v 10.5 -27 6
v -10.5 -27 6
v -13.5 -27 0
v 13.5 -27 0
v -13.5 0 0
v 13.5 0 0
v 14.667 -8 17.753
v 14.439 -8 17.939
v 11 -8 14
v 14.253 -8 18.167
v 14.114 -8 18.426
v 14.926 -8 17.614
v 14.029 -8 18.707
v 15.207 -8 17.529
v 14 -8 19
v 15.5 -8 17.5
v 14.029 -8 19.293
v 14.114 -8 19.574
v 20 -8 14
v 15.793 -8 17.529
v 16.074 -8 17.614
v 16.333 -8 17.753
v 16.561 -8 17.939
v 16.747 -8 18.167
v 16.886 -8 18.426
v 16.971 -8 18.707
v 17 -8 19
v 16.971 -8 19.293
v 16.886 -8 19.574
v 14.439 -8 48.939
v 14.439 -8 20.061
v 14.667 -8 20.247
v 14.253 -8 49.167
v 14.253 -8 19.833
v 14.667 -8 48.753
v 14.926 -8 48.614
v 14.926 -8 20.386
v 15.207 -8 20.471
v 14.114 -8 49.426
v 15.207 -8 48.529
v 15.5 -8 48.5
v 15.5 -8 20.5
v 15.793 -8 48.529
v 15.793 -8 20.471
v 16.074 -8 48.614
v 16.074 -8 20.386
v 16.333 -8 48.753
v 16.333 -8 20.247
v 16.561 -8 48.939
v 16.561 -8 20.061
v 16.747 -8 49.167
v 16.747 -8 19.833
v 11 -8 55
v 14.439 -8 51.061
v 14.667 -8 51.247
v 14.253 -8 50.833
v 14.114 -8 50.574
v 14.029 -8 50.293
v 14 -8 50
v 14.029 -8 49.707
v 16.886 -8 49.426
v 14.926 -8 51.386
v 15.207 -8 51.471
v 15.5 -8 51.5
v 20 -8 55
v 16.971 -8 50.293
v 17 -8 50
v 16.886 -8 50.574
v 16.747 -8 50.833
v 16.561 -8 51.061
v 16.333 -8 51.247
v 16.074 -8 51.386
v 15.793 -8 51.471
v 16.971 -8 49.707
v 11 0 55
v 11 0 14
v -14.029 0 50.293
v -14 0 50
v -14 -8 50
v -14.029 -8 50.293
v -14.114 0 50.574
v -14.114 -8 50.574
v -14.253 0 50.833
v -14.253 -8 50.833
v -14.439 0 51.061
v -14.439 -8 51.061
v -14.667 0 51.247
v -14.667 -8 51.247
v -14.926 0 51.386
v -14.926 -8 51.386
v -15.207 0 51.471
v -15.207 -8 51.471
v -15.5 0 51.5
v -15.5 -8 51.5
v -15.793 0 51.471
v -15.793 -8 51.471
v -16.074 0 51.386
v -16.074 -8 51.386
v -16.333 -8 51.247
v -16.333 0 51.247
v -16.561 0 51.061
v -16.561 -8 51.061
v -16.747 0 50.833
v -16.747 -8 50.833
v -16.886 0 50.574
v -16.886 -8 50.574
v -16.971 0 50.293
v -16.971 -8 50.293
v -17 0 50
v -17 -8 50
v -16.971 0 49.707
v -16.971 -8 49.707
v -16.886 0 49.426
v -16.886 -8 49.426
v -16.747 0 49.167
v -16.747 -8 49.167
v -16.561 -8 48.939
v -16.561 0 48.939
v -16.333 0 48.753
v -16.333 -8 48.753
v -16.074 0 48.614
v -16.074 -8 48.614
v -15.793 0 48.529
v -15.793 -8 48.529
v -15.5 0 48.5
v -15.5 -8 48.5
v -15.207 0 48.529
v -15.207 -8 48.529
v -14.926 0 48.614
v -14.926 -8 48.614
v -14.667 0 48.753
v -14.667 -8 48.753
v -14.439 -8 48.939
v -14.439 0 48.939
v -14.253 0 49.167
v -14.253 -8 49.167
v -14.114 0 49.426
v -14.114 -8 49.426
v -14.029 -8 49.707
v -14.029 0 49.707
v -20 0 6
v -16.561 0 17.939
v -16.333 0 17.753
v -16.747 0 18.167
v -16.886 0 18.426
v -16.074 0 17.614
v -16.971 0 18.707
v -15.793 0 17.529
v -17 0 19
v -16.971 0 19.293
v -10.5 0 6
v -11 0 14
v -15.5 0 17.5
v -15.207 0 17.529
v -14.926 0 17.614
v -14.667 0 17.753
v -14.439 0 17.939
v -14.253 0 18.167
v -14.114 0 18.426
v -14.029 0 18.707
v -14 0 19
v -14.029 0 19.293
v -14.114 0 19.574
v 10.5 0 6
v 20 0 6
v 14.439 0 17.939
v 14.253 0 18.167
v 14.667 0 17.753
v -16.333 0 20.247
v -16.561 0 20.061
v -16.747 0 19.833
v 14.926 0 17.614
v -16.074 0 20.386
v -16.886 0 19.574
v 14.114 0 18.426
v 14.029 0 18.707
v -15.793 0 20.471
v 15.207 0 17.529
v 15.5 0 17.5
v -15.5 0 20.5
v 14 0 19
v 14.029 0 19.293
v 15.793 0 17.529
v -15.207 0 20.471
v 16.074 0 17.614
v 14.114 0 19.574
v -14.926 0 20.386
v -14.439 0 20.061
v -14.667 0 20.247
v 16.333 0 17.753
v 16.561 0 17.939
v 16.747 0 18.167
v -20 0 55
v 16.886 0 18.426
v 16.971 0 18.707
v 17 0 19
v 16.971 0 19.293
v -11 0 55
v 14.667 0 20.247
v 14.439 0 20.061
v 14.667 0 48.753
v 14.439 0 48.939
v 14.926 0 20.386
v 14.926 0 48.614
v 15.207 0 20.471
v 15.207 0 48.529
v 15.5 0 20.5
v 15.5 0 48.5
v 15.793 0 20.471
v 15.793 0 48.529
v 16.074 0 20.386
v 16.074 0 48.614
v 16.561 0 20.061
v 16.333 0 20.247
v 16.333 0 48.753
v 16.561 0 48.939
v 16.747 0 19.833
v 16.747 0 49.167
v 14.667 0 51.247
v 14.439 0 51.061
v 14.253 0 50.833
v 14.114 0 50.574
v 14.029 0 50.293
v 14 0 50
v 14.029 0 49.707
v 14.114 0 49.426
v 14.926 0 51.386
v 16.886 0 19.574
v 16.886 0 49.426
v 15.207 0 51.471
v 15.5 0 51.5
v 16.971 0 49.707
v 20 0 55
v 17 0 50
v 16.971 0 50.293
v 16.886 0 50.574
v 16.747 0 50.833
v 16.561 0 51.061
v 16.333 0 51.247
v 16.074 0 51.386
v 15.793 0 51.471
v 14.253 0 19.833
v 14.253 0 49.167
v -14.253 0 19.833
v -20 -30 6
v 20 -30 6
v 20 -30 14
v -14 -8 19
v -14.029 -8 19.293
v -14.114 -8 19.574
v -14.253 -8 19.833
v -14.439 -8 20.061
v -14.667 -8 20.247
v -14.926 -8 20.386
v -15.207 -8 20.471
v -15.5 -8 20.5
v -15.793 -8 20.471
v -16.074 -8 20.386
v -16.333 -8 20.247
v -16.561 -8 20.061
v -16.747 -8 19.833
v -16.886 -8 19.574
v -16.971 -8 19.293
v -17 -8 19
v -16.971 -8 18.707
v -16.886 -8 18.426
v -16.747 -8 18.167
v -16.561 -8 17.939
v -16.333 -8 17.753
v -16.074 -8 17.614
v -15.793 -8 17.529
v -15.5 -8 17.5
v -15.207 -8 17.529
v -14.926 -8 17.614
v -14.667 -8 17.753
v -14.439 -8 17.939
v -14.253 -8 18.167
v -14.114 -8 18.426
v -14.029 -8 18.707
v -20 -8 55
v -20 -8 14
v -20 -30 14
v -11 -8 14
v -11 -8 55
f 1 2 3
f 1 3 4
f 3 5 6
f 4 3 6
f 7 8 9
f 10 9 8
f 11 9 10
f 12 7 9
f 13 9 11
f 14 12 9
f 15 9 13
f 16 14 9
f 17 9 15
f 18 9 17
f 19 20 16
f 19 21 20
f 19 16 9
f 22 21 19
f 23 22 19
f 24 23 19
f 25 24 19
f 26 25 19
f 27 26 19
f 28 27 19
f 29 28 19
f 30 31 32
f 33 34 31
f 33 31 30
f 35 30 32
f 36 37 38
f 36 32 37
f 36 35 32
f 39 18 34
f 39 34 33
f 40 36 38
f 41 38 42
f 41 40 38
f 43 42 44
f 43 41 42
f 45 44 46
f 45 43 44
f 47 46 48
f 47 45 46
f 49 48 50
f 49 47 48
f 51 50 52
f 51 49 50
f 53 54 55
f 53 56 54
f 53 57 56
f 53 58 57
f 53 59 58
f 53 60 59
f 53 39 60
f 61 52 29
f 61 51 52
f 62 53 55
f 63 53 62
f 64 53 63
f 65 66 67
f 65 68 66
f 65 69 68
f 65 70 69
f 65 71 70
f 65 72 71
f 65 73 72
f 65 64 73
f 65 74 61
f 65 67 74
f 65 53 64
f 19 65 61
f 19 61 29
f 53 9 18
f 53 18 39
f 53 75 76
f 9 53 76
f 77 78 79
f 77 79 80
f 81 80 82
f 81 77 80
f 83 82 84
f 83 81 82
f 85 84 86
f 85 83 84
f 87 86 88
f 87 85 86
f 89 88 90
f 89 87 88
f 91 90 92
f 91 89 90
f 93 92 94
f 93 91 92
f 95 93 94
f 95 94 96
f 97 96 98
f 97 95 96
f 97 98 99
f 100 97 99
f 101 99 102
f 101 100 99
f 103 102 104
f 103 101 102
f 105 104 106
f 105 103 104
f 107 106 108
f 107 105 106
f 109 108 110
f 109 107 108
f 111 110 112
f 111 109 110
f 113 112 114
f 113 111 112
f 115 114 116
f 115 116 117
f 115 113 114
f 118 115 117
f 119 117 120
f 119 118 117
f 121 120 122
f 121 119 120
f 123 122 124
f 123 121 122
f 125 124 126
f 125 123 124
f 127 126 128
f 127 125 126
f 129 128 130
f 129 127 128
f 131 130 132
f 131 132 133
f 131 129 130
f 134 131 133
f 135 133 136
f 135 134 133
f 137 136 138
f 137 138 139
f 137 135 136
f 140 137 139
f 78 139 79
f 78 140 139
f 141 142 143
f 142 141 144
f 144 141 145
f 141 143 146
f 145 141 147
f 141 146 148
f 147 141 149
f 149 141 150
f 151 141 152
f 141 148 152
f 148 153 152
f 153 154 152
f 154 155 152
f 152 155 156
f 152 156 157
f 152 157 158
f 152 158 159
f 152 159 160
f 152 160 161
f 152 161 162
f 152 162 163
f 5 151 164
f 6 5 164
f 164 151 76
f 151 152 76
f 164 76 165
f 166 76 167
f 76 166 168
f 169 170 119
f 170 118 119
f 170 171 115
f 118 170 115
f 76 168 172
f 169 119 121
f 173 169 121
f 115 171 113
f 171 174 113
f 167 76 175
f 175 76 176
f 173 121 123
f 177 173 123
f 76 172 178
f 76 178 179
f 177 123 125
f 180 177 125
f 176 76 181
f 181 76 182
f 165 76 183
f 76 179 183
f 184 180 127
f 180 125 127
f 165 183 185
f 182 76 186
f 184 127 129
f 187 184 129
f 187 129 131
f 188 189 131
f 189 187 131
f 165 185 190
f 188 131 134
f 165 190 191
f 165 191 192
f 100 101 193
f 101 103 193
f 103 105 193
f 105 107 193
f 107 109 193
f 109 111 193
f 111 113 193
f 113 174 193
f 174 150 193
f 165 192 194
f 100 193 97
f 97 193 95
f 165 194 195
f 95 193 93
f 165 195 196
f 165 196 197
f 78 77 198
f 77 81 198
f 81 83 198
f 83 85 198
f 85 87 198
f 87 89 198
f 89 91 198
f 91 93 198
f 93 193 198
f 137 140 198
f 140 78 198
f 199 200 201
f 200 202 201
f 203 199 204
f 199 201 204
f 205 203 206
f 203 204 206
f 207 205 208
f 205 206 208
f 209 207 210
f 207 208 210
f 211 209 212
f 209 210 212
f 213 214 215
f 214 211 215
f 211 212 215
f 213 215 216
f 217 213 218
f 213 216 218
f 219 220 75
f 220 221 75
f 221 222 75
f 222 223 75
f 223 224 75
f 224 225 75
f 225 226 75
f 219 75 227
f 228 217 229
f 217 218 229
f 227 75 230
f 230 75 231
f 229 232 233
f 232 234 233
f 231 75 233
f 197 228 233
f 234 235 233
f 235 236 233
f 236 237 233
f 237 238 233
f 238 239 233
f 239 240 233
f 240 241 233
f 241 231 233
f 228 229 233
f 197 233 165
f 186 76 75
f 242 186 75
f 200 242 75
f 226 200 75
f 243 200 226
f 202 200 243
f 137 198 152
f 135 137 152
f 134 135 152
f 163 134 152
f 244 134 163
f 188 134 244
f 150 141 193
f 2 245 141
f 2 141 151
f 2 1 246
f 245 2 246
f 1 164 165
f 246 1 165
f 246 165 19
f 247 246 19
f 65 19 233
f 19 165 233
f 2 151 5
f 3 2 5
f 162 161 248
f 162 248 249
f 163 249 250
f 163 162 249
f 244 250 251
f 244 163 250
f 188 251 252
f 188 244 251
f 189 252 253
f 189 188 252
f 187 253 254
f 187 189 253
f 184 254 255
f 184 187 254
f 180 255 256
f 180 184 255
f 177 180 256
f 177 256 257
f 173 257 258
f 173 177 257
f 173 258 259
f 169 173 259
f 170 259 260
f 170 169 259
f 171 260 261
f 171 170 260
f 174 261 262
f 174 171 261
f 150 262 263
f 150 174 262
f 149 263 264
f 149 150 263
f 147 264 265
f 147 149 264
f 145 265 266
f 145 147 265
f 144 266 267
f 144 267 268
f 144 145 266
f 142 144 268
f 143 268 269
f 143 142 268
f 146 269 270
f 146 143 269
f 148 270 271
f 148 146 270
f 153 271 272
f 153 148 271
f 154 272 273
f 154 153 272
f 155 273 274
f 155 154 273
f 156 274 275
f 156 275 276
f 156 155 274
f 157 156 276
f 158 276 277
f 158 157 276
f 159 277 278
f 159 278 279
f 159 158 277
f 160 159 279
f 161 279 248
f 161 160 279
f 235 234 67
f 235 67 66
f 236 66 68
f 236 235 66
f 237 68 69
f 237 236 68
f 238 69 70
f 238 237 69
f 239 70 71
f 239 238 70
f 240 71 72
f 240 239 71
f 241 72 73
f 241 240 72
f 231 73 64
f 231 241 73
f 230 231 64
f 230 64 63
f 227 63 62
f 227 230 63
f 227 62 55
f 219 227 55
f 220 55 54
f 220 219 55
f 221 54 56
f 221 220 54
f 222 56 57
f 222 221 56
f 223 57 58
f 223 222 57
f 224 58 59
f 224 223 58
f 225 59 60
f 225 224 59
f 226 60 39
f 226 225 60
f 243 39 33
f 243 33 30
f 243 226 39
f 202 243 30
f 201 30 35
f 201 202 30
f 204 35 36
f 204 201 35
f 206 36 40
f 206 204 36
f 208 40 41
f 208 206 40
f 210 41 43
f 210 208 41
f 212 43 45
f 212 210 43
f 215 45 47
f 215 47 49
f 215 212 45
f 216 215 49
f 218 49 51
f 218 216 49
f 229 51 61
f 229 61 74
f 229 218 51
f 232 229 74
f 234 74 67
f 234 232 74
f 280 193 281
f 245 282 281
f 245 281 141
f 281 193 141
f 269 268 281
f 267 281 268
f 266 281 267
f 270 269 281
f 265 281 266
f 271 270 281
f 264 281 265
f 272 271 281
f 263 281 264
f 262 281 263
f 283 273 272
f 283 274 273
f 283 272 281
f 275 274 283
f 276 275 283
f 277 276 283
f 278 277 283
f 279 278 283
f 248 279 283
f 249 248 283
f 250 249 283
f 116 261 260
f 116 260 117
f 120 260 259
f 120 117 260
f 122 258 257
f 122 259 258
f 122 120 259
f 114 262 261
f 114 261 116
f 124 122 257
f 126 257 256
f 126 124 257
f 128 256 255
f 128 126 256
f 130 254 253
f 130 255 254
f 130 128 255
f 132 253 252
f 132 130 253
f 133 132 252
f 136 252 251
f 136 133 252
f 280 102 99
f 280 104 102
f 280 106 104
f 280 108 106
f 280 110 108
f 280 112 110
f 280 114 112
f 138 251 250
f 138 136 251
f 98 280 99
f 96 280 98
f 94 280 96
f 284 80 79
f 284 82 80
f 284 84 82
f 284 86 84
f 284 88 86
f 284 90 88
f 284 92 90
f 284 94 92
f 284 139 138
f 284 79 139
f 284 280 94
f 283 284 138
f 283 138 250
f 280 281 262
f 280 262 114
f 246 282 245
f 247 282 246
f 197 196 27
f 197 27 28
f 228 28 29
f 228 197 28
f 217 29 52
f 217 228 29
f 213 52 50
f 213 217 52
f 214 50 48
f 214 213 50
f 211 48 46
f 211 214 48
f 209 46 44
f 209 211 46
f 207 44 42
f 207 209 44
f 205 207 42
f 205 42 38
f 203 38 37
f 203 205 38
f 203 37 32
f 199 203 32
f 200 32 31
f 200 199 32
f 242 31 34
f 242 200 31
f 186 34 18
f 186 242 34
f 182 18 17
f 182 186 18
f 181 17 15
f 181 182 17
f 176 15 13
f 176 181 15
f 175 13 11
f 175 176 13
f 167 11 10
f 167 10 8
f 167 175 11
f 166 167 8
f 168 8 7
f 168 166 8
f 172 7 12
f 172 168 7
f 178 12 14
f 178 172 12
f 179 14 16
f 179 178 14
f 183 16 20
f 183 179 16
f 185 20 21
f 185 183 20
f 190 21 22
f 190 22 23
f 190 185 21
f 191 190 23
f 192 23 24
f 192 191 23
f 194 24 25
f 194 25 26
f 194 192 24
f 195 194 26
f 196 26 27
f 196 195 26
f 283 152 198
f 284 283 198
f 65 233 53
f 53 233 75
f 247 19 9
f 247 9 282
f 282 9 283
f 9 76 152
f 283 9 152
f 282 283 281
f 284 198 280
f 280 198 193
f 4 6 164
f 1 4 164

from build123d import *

# Parameters (mm, degrees)
F1_DEPTH = 27
F2_R     = 1.5
F3_DEPTH = 8
F4_W     = 40
F4_H     = 8
F5_DEPTH = 30


with BuildPart() as f1:
    # F0 (on Front) → F1 (new body)
    with BuildSketch(Plane.XZ):
        Polygon((-10.5, 6), (-13.5, 0), (13.5, 0), (10.5, 6), align=None)
    extrude(amount=F1_DEPTH)

    # F2 (on Front) → F3 (join)
    with BuildSketch(Plane.XZ):
        Polygon((-10.5, 6), (10.5, 6), (20, 6), (20, 55), (11, 55), (11, 14), (-11, 14), (-11, 55), (-20, 55), (-20, 6), align=None)
        with Locations((-15.5, 19)):
            Circle(F2_R, mode=Mode.SUBTRACT)
        with Locations((15.5, 19)):
            Circle(F2_R, mode=Mode.SUBTRACT)
        with Locations((-15.5, 50)):
            Circle(F2_R, mode=Mode.SUBTRACT)
        with Locations((15.5, 50)):
            Circle(F2_R, mode=Mode.SUBTRACT)
    extrude(amount=F3_DEPTH)

    # F4 (on Front) → F5 (join)
    with BuildSketch(Plane.XZ):
        with Locations((0, 10)):
            Rectangle(F4_W, F4_H)
    extrude(amount=F5_DEPTH)


solid = f1.part
